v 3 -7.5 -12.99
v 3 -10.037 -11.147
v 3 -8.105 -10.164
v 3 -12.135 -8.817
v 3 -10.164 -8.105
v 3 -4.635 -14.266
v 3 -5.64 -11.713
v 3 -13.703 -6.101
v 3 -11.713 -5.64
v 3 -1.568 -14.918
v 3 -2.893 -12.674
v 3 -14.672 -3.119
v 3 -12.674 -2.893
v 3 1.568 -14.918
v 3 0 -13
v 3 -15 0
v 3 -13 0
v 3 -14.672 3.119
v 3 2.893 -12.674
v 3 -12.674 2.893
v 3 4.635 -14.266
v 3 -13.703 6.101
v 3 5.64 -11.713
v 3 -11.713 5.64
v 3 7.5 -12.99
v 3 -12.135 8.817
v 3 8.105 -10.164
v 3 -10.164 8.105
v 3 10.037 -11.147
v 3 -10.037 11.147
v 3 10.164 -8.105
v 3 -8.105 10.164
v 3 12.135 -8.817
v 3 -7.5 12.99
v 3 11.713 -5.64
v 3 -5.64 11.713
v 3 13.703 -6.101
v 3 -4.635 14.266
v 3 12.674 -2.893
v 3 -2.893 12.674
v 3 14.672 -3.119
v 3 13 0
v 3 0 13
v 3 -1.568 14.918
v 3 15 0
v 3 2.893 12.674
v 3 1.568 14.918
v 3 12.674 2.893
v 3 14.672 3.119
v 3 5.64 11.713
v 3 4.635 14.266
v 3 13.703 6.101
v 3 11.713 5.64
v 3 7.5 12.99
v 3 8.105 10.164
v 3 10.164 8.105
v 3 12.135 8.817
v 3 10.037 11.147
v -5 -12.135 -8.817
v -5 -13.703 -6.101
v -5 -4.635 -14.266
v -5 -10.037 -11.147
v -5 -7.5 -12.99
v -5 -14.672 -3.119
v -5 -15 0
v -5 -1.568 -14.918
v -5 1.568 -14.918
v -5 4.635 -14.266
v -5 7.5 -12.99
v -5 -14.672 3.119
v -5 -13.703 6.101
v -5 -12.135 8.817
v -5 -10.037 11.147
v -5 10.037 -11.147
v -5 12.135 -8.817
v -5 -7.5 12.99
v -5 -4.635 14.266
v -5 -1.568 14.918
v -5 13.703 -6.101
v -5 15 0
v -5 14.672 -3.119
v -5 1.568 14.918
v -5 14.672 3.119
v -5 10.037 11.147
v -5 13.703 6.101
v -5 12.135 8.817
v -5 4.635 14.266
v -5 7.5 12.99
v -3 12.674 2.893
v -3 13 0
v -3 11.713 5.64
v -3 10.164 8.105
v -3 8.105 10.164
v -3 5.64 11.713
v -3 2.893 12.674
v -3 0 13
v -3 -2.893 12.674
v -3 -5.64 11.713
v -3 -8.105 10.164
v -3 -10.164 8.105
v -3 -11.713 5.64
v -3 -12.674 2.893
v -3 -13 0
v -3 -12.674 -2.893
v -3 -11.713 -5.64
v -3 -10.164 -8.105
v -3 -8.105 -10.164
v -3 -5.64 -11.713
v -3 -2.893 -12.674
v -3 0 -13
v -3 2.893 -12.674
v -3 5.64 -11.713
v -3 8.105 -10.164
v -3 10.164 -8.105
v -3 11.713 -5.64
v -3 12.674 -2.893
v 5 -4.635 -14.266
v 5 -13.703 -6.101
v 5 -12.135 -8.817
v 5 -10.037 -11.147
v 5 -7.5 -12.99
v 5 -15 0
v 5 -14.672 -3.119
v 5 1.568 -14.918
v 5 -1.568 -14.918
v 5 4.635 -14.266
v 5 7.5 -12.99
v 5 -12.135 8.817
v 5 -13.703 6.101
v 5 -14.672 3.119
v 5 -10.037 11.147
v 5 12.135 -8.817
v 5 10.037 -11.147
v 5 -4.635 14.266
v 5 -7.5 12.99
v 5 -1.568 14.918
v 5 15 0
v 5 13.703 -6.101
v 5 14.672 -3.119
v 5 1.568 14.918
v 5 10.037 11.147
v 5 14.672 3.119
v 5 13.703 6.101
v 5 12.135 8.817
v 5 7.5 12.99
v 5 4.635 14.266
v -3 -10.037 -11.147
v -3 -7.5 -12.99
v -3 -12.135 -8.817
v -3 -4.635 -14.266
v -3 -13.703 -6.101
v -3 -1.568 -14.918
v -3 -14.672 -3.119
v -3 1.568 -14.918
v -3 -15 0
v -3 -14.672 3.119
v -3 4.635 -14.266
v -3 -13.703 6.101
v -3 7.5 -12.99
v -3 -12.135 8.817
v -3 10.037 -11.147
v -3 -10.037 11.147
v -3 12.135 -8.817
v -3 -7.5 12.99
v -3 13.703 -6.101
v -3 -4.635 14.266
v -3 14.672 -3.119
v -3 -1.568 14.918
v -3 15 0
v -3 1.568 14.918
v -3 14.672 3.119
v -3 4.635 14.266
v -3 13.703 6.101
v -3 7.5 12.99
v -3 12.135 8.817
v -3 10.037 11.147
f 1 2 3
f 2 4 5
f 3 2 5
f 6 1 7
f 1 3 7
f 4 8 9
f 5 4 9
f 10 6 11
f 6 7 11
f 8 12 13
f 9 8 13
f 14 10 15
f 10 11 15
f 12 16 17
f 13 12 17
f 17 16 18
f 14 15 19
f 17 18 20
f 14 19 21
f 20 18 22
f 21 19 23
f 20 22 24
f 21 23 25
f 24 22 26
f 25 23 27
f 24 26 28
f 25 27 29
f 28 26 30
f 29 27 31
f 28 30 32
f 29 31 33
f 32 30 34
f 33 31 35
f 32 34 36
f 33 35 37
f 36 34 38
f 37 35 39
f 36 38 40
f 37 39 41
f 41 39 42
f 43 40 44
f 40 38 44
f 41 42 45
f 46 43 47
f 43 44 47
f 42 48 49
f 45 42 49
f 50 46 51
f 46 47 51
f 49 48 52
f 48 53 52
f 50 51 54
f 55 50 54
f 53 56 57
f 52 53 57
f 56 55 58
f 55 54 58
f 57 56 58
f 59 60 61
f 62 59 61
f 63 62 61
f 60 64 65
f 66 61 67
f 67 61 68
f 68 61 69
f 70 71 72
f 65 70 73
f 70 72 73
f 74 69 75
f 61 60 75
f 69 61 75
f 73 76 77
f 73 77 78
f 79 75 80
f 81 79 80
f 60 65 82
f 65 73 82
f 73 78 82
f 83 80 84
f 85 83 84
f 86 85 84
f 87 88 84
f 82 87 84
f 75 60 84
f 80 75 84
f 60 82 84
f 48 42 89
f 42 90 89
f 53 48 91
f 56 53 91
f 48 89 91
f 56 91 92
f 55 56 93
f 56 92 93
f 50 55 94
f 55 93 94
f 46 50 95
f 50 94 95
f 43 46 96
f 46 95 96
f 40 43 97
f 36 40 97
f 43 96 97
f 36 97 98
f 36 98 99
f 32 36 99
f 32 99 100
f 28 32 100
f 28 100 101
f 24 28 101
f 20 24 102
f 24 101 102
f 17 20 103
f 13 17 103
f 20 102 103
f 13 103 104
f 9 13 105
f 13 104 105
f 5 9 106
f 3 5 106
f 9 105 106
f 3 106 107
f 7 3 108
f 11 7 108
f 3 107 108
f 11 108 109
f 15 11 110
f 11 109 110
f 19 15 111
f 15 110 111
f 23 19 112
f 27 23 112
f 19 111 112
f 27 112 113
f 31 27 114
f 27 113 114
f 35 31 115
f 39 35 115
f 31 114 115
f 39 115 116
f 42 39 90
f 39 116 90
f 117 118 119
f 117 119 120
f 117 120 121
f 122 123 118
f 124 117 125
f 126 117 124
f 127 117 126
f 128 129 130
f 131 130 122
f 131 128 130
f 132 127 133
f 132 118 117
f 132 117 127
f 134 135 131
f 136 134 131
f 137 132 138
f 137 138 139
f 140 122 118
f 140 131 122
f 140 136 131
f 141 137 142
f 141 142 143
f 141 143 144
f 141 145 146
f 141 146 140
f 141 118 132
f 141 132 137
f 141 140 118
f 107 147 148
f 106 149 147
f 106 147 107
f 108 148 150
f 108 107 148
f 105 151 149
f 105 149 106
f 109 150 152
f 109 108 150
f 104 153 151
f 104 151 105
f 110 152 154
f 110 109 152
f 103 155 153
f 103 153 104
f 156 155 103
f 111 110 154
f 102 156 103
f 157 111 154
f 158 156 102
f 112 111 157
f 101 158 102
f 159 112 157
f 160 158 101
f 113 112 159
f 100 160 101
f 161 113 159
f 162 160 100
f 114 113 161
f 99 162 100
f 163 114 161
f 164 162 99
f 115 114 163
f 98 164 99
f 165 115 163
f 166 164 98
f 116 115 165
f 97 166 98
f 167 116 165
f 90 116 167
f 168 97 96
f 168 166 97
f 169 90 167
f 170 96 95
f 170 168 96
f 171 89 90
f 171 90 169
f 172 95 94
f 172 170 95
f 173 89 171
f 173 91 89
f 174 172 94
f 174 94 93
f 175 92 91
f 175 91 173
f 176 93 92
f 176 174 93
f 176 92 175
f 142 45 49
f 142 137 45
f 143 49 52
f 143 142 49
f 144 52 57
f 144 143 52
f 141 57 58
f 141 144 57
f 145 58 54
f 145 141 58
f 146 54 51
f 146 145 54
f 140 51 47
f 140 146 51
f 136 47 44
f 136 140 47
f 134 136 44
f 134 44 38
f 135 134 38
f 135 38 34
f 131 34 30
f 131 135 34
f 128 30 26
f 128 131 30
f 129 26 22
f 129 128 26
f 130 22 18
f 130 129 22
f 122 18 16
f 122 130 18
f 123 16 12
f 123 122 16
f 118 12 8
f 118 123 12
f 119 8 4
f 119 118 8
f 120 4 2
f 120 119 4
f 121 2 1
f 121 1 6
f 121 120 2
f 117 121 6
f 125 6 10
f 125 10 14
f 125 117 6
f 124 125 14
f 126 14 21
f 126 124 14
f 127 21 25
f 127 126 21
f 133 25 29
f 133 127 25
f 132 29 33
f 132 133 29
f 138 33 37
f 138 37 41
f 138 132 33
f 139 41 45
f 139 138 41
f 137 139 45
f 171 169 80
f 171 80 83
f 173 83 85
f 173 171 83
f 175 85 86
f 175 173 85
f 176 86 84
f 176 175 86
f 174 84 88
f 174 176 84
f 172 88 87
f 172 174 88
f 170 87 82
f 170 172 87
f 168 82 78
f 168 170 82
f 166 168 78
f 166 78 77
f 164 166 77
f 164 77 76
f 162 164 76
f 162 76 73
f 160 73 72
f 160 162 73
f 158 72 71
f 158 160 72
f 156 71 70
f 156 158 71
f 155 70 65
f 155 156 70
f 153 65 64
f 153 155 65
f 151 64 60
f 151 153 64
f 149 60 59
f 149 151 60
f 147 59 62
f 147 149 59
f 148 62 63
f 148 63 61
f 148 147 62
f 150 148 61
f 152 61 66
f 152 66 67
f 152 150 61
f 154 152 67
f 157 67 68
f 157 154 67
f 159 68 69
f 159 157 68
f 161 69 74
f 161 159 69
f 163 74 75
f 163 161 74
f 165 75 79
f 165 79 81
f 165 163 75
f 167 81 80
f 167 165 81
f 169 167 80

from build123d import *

# Parameters (mm, degrees)
F0_R     = 15
F1_DEPTH = 5
F2_R     = 15
F2_R_2   = 13
F3_DEPTH = 3


# Not quite as in the source:
# - a feature names something its author has since deleted; it is built from what else it names


with BuildPart() as f1:
    # F0 (on Right) → F1 (new body, symmetric)
    with BuildSketch(Plane.YZ):
        Circle(F0_R)
    extrude(amount=F1_DEPTH, both=True)

    # F2 (on Right) → F3 (cut, symmetric)
    with BuildSketch(Plane.YZ):
        Circle(F2_R)
        Circle(F2_R_2, mode=Mode.SUBTRACT)
    extrude(amount=F3_DEPTH, both=True, mode=Mode.SUBTRACT)


solid = f1.part
